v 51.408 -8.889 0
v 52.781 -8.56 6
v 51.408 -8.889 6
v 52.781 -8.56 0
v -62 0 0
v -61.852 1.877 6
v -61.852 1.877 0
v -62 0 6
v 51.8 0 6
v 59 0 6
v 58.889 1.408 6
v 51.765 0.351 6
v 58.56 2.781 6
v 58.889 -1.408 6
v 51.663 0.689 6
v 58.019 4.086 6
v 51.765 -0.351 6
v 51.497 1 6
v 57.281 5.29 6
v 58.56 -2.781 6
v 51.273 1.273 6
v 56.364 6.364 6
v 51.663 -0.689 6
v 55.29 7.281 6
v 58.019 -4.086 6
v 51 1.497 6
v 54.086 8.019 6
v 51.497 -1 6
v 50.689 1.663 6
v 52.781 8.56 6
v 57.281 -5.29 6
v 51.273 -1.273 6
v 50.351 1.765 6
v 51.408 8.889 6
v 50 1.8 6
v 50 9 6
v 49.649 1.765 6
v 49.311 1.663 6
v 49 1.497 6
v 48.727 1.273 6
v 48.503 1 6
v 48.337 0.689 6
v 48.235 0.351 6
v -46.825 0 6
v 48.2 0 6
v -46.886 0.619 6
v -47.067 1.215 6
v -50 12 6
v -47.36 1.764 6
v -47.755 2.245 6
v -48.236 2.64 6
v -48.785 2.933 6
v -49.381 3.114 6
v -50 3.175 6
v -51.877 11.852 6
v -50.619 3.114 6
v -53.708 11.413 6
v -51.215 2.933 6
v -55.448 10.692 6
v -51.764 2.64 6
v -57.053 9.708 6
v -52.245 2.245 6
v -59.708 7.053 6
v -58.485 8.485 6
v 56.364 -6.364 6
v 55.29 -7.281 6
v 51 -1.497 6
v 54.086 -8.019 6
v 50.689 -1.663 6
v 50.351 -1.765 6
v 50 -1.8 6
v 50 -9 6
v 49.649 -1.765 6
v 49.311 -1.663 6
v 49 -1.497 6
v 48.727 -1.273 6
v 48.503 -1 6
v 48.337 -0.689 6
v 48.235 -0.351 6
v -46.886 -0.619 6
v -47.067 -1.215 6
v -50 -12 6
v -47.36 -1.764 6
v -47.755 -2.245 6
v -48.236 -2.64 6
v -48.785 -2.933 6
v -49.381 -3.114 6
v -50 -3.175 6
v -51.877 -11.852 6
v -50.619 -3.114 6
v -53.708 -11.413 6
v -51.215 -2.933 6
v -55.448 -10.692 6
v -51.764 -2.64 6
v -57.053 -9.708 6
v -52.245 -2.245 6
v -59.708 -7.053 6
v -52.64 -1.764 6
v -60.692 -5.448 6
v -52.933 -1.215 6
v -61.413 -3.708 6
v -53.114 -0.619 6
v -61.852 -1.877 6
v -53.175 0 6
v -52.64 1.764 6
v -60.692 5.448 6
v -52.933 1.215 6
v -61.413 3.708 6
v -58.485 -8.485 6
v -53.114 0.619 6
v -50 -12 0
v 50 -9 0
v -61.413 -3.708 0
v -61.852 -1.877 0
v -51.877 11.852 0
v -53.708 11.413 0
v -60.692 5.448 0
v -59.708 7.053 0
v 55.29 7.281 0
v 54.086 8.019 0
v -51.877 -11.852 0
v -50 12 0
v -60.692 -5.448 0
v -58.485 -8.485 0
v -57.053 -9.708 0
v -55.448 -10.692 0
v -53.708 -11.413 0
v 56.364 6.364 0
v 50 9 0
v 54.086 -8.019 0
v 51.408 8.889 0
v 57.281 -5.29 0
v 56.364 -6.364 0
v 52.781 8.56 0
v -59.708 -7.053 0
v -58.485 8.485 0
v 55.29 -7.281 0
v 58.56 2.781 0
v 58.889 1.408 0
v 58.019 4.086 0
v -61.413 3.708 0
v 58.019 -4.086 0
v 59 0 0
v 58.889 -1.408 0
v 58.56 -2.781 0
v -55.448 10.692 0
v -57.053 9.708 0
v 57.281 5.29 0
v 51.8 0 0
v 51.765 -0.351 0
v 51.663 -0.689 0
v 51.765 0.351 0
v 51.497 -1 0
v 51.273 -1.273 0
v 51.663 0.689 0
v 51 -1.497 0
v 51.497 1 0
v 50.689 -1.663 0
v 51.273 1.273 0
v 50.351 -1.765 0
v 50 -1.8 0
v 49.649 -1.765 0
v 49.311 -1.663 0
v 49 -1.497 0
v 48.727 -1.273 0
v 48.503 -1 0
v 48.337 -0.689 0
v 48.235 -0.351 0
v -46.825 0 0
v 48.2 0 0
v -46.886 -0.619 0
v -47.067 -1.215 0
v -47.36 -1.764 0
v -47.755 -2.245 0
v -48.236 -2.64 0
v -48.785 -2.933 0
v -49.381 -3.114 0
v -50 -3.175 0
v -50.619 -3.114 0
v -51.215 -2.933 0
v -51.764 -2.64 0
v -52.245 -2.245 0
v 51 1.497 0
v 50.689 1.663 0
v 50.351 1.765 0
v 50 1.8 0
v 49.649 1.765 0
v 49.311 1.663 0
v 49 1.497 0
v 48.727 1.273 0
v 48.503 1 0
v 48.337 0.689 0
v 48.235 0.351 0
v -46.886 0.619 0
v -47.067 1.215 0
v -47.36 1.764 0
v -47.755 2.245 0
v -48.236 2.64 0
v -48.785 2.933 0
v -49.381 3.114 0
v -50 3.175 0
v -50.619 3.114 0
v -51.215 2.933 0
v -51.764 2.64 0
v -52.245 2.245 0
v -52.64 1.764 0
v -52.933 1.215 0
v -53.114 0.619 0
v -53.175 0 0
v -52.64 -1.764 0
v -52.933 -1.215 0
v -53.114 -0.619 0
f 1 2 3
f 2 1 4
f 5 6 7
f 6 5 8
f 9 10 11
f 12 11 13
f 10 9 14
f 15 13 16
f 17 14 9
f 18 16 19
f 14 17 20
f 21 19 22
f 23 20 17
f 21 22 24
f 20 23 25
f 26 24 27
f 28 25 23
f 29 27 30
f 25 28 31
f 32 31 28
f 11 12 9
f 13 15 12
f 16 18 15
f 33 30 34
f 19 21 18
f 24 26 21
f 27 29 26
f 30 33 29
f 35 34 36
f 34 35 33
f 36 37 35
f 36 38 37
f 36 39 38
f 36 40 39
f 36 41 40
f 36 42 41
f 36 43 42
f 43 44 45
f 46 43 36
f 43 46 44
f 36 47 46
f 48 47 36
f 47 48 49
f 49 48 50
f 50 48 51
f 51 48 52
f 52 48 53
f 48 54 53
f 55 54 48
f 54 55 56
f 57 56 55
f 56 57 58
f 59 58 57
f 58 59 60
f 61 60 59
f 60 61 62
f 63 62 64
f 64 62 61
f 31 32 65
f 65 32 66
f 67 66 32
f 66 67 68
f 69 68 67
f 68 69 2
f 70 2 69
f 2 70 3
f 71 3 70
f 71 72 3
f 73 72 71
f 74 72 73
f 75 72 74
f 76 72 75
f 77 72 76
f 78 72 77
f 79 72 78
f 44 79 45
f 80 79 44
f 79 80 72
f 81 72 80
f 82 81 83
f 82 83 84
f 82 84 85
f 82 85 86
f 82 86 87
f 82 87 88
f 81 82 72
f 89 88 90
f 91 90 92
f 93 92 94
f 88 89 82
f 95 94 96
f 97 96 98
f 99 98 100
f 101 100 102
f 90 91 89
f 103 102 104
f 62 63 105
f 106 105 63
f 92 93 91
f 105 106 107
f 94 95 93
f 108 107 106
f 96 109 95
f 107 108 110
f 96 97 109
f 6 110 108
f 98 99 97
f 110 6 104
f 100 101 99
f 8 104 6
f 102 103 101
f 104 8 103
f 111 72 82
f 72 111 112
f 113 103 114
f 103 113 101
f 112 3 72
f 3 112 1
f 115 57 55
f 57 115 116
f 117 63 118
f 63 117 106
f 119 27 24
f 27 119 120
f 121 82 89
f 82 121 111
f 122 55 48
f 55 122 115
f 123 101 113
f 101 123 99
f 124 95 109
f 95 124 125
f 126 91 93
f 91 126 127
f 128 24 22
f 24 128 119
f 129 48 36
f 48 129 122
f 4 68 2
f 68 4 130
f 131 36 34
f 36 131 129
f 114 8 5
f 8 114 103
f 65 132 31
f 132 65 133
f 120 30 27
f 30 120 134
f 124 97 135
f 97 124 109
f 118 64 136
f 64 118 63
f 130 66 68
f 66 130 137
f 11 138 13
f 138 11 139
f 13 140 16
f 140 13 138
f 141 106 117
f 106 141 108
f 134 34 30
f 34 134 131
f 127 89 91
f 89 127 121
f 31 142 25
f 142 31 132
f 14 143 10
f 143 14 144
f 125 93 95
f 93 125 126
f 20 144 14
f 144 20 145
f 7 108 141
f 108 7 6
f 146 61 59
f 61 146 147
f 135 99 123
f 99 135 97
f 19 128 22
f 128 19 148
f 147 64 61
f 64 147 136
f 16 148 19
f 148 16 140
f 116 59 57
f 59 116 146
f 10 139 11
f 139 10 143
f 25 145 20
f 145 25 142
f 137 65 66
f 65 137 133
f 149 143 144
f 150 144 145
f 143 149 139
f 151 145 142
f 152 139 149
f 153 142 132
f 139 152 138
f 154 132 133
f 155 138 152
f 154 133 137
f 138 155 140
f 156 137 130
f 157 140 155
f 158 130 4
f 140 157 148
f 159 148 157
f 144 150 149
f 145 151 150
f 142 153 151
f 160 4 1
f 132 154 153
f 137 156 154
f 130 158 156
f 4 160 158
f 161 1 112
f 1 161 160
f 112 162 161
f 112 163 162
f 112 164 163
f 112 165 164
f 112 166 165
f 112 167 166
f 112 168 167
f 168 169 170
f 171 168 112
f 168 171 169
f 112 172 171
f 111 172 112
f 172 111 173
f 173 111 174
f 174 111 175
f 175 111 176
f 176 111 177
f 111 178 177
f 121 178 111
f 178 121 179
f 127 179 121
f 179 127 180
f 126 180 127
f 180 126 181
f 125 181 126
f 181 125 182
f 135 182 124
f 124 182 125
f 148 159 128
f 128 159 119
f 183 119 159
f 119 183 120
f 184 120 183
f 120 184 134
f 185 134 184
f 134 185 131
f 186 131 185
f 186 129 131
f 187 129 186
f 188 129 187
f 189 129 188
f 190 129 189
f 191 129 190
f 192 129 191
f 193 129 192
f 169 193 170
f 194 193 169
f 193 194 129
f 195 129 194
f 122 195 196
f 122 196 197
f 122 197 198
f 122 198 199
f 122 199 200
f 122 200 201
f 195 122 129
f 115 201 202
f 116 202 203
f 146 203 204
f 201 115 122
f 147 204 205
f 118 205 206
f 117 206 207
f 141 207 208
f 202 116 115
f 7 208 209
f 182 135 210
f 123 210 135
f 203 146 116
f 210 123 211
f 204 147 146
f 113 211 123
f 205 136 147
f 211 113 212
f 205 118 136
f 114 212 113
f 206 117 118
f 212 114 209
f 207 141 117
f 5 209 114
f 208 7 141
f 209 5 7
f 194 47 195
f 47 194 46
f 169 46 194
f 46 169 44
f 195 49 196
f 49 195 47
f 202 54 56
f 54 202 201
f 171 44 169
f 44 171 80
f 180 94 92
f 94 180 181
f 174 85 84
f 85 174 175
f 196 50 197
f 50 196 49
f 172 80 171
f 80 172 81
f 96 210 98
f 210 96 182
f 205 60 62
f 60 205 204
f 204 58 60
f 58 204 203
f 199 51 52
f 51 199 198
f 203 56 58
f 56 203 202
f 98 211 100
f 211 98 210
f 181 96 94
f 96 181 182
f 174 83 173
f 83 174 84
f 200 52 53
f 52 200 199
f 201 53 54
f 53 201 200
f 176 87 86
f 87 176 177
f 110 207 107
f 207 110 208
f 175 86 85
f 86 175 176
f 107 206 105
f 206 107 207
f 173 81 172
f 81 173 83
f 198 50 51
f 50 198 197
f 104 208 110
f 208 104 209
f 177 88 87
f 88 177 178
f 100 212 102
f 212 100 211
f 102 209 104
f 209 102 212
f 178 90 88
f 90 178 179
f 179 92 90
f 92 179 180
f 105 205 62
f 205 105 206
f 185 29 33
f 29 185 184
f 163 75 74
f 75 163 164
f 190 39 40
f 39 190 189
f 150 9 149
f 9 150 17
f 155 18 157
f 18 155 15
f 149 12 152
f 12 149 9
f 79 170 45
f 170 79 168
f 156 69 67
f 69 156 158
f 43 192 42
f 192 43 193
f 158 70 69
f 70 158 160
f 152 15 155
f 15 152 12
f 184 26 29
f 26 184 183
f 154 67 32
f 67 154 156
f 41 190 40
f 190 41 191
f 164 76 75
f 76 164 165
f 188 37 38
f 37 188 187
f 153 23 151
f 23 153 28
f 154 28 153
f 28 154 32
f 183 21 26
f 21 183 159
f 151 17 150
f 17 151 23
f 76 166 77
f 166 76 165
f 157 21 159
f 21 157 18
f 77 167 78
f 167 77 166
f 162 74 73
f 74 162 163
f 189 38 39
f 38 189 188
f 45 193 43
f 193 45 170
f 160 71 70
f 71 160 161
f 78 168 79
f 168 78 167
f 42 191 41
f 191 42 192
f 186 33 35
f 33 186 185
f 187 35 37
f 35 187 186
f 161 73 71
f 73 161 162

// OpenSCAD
$fn = 32;

// ----------------------------------------------------------------------
// Lever: 100 mm between the bosses, 6 mm thick, smooth outline
// ----------------------------------------------------------------------

// --- parameters (mm) ---
lever_l = 100;            // distance between the boss centres
boss_a = 24;              // first boss diameter
boss_b = 18;              // second boss diameter
bore_a = 6.35;            // first bore
bore_b = 3.6;             // second bore
lever_t = 6;              // lever thickness

lever_profile = [[-62, 0], [-61.852, -1.877], [-61.413, -3.708], [-60.692, -5.448], [-59.708, -7.053], [-58.485, -8.485], [-57.053, -9.708], [-55.448, -10.692], [-53.708, -11.413], [-51.877, -11.852], [-50, -12], [50, -9], [51.408, -8.889], [52.781, -8.56], [54.086, -8.019], [55.29, -7.281], [56.364, -6.364], [57.281, -5.29], [58.019, -4.086], [58.56, -2.781], [58.889, -1.408], [59, 0], [58.889, 1.408], [58.56, 2.781], [58.019, 4.086], [57.281, 5.29], [56.364, 6.364], [55.29, 7.281], [54.086, 8.019], [52.781, 8.56], [51.408, 8.889], [50, 9], [-50, 12], [-51.877, 11.852], [-53.708, 11.413], [-55.448, 10.692], [-57.053, 9.708], [-58.485, 8.485], [-59.708, 7.053], [-60.692, 5.448], [-61.413, 3.708], [-61.852, 1.877]];

difference() {
  linear_extrude(height = lever_t) polygon(lever_profile);
  translate([-50, 0, -2.5]) cylinder(h = lever_t + 5, d = bore_a);
  translate([50, 0, -2.5]) cylinder(h = lever_t + 5, d = bore_b);
}
